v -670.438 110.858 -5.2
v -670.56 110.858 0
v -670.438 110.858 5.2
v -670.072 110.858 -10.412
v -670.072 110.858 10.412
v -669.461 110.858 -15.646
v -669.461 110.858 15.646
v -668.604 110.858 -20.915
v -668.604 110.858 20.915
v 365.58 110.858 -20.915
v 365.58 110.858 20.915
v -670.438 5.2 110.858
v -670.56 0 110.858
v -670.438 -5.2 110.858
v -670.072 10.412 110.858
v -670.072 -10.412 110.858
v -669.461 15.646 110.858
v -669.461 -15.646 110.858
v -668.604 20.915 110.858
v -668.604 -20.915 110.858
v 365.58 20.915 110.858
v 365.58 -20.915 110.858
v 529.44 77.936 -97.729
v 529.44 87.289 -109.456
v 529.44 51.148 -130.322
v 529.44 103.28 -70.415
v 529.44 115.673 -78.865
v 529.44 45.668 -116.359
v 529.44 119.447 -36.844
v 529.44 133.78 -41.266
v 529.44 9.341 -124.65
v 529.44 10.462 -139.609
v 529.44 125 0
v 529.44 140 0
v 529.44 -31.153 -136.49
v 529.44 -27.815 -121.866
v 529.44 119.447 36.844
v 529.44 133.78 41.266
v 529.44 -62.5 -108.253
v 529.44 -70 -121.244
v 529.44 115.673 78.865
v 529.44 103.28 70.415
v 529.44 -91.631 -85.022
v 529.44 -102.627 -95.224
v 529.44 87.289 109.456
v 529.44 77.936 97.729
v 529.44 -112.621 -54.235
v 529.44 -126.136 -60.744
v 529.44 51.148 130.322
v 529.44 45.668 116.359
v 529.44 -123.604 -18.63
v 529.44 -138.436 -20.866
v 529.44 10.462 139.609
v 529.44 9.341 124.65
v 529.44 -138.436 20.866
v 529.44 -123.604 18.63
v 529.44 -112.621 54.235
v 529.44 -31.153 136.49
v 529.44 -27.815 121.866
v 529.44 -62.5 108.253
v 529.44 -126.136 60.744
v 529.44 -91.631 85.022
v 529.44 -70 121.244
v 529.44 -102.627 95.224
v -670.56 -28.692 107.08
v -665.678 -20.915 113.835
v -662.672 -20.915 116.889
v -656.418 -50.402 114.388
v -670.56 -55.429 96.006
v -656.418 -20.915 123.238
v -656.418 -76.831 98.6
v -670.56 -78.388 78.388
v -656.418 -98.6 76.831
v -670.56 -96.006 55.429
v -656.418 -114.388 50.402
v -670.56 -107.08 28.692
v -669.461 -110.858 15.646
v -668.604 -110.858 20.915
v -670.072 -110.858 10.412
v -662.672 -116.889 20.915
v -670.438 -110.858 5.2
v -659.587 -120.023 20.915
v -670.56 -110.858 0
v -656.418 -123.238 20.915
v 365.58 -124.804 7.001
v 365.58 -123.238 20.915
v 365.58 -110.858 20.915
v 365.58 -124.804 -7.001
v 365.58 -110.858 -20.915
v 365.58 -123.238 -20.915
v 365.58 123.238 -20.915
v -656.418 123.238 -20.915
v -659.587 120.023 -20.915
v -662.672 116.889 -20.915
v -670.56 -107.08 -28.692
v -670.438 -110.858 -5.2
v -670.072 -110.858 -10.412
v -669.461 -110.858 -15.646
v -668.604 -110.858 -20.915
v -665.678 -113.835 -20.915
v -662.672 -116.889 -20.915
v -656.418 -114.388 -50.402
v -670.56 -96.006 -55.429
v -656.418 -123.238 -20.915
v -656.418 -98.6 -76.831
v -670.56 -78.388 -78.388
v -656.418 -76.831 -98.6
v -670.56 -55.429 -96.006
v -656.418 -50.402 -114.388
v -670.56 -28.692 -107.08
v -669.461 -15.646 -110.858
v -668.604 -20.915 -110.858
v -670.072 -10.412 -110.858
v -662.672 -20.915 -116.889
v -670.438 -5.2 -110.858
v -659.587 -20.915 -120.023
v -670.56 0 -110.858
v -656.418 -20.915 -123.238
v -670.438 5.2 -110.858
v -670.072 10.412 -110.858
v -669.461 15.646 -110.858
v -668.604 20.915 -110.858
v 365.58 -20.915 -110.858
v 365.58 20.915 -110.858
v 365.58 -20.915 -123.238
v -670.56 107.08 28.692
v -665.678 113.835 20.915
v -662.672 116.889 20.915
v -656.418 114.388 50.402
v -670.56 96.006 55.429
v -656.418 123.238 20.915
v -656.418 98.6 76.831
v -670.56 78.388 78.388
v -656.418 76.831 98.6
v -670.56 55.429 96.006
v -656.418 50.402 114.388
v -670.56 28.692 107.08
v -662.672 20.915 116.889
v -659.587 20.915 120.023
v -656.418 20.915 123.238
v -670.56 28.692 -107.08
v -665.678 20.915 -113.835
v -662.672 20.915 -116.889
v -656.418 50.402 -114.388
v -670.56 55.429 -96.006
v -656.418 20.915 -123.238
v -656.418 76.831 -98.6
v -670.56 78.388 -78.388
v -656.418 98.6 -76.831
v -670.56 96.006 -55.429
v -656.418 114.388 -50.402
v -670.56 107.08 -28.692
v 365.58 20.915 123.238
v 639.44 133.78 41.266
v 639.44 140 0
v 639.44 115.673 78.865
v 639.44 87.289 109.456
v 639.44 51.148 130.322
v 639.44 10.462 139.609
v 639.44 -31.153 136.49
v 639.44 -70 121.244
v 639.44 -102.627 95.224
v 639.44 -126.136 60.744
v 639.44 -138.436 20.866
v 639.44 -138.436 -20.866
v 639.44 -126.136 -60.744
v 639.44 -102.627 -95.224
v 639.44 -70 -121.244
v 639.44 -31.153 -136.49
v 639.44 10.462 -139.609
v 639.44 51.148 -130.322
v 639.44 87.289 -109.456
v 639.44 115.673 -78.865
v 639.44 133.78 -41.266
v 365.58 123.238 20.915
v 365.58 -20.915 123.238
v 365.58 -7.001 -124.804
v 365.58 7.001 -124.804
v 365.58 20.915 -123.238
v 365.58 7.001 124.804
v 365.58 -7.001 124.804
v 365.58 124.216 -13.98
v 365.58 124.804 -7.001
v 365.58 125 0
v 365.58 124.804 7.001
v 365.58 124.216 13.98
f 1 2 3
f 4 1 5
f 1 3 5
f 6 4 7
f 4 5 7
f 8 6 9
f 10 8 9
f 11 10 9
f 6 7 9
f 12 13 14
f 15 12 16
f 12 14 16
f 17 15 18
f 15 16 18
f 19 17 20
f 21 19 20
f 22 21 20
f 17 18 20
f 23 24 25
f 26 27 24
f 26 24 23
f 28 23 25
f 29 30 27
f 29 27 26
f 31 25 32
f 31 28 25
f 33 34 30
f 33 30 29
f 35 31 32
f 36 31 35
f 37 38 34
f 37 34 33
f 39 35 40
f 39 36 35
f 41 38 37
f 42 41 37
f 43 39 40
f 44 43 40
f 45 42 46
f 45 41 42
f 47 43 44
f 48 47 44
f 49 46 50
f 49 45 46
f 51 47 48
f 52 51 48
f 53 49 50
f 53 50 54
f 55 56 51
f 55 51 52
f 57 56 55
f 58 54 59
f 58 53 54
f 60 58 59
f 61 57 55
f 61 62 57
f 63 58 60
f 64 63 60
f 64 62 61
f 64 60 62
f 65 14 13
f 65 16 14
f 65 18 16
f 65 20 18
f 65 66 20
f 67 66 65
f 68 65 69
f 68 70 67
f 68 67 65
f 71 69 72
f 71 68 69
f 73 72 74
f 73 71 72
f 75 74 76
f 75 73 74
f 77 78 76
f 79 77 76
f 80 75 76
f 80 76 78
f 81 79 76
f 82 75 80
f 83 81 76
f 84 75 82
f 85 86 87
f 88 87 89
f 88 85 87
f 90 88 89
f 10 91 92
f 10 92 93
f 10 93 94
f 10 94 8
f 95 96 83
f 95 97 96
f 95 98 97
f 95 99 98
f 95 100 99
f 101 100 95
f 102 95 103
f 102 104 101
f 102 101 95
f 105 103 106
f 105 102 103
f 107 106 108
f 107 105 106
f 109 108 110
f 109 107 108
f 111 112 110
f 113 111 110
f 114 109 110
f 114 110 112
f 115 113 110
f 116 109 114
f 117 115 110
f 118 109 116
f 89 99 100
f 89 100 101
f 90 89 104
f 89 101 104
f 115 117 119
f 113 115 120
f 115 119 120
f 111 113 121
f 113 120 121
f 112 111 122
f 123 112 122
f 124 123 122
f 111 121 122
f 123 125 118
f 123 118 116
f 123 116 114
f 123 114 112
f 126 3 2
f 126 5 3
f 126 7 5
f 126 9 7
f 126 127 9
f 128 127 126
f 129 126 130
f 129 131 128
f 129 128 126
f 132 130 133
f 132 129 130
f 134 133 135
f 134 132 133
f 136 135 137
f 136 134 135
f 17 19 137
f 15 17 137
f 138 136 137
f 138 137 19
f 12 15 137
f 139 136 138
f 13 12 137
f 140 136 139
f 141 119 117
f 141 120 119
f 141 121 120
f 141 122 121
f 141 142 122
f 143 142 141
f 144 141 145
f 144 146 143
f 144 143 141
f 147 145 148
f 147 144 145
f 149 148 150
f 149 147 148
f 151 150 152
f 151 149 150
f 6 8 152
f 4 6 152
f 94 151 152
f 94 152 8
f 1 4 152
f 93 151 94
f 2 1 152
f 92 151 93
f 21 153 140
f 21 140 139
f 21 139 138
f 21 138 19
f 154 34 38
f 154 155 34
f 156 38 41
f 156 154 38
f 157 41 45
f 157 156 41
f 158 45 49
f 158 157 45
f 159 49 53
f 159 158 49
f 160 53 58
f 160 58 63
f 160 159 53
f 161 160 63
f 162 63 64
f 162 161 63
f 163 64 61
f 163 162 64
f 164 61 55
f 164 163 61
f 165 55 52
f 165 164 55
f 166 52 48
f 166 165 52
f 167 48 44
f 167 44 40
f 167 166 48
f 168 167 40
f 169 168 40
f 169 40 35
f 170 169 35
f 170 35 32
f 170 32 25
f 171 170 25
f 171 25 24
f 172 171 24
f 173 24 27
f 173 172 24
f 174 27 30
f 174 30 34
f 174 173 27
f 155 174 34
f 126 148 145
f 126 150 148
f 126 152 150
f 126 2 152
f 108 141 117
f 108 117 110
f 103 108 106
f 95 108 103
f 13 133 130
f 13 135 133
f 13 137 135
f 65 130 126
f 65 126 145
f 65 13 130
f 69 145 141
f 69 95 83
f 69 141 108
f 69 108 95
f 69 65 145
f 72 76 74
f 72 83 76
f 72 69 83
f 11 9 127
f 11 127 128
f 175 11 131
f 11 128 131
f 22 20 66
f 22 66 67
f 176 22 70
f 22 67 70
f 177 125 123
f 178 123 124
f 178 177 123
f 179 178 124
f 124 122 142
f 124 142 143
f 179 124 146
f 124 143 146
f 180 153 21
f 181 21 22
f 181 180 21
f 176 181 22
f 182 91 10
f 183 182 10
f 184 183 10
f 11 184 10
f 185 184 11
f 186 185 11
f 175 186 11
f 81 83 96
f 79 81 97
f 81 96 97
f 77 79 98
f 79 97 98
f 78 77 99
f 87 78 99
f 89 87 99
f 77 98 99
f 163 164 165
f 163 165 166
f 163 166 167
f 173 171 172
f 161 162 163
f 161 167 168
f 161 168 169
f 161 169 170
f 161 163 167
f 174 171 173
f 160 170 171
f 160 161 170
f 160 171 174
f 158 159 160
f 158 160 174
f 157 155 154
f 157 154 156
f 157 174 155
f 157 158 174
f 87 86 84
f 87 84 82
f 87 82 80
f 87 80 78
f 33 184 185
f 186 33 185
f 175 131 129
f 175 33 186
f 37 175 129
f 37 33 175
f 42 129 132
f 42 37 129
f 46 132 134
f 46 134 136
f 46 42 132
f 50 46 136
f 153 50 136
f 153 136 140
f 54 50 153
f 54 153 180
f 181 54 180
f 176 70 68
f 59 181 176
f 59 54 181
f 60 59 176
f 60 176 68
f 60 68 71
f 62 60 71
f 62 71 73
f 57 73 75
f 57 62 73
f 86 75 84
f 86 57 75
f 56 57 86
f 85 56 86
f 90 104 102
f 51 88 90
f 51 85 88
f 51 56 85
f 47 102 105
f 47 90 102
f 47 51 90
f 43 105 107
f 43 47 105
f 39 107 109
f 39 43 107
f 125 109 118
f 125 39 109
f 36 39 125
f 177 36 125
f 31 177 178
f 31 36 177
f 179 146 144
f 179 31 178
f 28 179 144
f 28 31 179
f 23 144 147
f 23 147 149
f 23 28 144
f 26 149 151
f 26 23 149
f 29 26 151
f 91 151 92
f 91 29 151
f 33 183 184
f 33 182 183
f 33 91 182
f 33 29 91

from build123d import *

# Parameters (mm, degrees)
CUT_EXTRUDE1_DEPTH = 1036.14
CIRPATTERN1_COUNT  = 4


with BuildPart() as part:
    # Sketch1 → Revolve1 (revolve)
    with BuildSketch(Plane.XY):
        Polygon((-670.560162424, 0), (-670.560162424, 110.857864376), (-656.418026801, 125), (529.439837576, 125), (529.439837576, 140), (639.439837576, 140), (639.439837576, 0), align=None)
    revolve(axis=Axis((-815.610544749, 0, 0), (1, 0, 0)))

    # Sketch2 → Cut-Extrude1 (cut)
    with BuildSketch(Plane.ZY.offset(670.560162424)):
        with BuildLine():
            Line((-20.915, 110.857864376), (20.915, 110.857864376))
            Line((20.915, 110.857864376), (20.915, 123.237830129))
            ThreePointArc((20.915, 123.237830129), (0, 125), (-20.915, 123.237830129))
            Line((-20.915, 123.237830129), (-20.915, 110.857864376))
        make_face()
    cut_extrude1 = extrude(amount=-CUT_EXTRUDE1_DEPTH, mode=Mode.SUBTRACT)

    # CirPattern1: Cut-Extrude1 ×4 about axis
    cirpattern1_axis = Axis((0, 0, 0), (1, 0, 0))
    for i in range(1, CIRPATTERN1_COUNT):
        add(cut_extrude1.rotate(cirpattern1_axis, i * 360 / CIRPATTERN1_COUNT), mode=Mode.SUBTRACT)


solid = part.part
